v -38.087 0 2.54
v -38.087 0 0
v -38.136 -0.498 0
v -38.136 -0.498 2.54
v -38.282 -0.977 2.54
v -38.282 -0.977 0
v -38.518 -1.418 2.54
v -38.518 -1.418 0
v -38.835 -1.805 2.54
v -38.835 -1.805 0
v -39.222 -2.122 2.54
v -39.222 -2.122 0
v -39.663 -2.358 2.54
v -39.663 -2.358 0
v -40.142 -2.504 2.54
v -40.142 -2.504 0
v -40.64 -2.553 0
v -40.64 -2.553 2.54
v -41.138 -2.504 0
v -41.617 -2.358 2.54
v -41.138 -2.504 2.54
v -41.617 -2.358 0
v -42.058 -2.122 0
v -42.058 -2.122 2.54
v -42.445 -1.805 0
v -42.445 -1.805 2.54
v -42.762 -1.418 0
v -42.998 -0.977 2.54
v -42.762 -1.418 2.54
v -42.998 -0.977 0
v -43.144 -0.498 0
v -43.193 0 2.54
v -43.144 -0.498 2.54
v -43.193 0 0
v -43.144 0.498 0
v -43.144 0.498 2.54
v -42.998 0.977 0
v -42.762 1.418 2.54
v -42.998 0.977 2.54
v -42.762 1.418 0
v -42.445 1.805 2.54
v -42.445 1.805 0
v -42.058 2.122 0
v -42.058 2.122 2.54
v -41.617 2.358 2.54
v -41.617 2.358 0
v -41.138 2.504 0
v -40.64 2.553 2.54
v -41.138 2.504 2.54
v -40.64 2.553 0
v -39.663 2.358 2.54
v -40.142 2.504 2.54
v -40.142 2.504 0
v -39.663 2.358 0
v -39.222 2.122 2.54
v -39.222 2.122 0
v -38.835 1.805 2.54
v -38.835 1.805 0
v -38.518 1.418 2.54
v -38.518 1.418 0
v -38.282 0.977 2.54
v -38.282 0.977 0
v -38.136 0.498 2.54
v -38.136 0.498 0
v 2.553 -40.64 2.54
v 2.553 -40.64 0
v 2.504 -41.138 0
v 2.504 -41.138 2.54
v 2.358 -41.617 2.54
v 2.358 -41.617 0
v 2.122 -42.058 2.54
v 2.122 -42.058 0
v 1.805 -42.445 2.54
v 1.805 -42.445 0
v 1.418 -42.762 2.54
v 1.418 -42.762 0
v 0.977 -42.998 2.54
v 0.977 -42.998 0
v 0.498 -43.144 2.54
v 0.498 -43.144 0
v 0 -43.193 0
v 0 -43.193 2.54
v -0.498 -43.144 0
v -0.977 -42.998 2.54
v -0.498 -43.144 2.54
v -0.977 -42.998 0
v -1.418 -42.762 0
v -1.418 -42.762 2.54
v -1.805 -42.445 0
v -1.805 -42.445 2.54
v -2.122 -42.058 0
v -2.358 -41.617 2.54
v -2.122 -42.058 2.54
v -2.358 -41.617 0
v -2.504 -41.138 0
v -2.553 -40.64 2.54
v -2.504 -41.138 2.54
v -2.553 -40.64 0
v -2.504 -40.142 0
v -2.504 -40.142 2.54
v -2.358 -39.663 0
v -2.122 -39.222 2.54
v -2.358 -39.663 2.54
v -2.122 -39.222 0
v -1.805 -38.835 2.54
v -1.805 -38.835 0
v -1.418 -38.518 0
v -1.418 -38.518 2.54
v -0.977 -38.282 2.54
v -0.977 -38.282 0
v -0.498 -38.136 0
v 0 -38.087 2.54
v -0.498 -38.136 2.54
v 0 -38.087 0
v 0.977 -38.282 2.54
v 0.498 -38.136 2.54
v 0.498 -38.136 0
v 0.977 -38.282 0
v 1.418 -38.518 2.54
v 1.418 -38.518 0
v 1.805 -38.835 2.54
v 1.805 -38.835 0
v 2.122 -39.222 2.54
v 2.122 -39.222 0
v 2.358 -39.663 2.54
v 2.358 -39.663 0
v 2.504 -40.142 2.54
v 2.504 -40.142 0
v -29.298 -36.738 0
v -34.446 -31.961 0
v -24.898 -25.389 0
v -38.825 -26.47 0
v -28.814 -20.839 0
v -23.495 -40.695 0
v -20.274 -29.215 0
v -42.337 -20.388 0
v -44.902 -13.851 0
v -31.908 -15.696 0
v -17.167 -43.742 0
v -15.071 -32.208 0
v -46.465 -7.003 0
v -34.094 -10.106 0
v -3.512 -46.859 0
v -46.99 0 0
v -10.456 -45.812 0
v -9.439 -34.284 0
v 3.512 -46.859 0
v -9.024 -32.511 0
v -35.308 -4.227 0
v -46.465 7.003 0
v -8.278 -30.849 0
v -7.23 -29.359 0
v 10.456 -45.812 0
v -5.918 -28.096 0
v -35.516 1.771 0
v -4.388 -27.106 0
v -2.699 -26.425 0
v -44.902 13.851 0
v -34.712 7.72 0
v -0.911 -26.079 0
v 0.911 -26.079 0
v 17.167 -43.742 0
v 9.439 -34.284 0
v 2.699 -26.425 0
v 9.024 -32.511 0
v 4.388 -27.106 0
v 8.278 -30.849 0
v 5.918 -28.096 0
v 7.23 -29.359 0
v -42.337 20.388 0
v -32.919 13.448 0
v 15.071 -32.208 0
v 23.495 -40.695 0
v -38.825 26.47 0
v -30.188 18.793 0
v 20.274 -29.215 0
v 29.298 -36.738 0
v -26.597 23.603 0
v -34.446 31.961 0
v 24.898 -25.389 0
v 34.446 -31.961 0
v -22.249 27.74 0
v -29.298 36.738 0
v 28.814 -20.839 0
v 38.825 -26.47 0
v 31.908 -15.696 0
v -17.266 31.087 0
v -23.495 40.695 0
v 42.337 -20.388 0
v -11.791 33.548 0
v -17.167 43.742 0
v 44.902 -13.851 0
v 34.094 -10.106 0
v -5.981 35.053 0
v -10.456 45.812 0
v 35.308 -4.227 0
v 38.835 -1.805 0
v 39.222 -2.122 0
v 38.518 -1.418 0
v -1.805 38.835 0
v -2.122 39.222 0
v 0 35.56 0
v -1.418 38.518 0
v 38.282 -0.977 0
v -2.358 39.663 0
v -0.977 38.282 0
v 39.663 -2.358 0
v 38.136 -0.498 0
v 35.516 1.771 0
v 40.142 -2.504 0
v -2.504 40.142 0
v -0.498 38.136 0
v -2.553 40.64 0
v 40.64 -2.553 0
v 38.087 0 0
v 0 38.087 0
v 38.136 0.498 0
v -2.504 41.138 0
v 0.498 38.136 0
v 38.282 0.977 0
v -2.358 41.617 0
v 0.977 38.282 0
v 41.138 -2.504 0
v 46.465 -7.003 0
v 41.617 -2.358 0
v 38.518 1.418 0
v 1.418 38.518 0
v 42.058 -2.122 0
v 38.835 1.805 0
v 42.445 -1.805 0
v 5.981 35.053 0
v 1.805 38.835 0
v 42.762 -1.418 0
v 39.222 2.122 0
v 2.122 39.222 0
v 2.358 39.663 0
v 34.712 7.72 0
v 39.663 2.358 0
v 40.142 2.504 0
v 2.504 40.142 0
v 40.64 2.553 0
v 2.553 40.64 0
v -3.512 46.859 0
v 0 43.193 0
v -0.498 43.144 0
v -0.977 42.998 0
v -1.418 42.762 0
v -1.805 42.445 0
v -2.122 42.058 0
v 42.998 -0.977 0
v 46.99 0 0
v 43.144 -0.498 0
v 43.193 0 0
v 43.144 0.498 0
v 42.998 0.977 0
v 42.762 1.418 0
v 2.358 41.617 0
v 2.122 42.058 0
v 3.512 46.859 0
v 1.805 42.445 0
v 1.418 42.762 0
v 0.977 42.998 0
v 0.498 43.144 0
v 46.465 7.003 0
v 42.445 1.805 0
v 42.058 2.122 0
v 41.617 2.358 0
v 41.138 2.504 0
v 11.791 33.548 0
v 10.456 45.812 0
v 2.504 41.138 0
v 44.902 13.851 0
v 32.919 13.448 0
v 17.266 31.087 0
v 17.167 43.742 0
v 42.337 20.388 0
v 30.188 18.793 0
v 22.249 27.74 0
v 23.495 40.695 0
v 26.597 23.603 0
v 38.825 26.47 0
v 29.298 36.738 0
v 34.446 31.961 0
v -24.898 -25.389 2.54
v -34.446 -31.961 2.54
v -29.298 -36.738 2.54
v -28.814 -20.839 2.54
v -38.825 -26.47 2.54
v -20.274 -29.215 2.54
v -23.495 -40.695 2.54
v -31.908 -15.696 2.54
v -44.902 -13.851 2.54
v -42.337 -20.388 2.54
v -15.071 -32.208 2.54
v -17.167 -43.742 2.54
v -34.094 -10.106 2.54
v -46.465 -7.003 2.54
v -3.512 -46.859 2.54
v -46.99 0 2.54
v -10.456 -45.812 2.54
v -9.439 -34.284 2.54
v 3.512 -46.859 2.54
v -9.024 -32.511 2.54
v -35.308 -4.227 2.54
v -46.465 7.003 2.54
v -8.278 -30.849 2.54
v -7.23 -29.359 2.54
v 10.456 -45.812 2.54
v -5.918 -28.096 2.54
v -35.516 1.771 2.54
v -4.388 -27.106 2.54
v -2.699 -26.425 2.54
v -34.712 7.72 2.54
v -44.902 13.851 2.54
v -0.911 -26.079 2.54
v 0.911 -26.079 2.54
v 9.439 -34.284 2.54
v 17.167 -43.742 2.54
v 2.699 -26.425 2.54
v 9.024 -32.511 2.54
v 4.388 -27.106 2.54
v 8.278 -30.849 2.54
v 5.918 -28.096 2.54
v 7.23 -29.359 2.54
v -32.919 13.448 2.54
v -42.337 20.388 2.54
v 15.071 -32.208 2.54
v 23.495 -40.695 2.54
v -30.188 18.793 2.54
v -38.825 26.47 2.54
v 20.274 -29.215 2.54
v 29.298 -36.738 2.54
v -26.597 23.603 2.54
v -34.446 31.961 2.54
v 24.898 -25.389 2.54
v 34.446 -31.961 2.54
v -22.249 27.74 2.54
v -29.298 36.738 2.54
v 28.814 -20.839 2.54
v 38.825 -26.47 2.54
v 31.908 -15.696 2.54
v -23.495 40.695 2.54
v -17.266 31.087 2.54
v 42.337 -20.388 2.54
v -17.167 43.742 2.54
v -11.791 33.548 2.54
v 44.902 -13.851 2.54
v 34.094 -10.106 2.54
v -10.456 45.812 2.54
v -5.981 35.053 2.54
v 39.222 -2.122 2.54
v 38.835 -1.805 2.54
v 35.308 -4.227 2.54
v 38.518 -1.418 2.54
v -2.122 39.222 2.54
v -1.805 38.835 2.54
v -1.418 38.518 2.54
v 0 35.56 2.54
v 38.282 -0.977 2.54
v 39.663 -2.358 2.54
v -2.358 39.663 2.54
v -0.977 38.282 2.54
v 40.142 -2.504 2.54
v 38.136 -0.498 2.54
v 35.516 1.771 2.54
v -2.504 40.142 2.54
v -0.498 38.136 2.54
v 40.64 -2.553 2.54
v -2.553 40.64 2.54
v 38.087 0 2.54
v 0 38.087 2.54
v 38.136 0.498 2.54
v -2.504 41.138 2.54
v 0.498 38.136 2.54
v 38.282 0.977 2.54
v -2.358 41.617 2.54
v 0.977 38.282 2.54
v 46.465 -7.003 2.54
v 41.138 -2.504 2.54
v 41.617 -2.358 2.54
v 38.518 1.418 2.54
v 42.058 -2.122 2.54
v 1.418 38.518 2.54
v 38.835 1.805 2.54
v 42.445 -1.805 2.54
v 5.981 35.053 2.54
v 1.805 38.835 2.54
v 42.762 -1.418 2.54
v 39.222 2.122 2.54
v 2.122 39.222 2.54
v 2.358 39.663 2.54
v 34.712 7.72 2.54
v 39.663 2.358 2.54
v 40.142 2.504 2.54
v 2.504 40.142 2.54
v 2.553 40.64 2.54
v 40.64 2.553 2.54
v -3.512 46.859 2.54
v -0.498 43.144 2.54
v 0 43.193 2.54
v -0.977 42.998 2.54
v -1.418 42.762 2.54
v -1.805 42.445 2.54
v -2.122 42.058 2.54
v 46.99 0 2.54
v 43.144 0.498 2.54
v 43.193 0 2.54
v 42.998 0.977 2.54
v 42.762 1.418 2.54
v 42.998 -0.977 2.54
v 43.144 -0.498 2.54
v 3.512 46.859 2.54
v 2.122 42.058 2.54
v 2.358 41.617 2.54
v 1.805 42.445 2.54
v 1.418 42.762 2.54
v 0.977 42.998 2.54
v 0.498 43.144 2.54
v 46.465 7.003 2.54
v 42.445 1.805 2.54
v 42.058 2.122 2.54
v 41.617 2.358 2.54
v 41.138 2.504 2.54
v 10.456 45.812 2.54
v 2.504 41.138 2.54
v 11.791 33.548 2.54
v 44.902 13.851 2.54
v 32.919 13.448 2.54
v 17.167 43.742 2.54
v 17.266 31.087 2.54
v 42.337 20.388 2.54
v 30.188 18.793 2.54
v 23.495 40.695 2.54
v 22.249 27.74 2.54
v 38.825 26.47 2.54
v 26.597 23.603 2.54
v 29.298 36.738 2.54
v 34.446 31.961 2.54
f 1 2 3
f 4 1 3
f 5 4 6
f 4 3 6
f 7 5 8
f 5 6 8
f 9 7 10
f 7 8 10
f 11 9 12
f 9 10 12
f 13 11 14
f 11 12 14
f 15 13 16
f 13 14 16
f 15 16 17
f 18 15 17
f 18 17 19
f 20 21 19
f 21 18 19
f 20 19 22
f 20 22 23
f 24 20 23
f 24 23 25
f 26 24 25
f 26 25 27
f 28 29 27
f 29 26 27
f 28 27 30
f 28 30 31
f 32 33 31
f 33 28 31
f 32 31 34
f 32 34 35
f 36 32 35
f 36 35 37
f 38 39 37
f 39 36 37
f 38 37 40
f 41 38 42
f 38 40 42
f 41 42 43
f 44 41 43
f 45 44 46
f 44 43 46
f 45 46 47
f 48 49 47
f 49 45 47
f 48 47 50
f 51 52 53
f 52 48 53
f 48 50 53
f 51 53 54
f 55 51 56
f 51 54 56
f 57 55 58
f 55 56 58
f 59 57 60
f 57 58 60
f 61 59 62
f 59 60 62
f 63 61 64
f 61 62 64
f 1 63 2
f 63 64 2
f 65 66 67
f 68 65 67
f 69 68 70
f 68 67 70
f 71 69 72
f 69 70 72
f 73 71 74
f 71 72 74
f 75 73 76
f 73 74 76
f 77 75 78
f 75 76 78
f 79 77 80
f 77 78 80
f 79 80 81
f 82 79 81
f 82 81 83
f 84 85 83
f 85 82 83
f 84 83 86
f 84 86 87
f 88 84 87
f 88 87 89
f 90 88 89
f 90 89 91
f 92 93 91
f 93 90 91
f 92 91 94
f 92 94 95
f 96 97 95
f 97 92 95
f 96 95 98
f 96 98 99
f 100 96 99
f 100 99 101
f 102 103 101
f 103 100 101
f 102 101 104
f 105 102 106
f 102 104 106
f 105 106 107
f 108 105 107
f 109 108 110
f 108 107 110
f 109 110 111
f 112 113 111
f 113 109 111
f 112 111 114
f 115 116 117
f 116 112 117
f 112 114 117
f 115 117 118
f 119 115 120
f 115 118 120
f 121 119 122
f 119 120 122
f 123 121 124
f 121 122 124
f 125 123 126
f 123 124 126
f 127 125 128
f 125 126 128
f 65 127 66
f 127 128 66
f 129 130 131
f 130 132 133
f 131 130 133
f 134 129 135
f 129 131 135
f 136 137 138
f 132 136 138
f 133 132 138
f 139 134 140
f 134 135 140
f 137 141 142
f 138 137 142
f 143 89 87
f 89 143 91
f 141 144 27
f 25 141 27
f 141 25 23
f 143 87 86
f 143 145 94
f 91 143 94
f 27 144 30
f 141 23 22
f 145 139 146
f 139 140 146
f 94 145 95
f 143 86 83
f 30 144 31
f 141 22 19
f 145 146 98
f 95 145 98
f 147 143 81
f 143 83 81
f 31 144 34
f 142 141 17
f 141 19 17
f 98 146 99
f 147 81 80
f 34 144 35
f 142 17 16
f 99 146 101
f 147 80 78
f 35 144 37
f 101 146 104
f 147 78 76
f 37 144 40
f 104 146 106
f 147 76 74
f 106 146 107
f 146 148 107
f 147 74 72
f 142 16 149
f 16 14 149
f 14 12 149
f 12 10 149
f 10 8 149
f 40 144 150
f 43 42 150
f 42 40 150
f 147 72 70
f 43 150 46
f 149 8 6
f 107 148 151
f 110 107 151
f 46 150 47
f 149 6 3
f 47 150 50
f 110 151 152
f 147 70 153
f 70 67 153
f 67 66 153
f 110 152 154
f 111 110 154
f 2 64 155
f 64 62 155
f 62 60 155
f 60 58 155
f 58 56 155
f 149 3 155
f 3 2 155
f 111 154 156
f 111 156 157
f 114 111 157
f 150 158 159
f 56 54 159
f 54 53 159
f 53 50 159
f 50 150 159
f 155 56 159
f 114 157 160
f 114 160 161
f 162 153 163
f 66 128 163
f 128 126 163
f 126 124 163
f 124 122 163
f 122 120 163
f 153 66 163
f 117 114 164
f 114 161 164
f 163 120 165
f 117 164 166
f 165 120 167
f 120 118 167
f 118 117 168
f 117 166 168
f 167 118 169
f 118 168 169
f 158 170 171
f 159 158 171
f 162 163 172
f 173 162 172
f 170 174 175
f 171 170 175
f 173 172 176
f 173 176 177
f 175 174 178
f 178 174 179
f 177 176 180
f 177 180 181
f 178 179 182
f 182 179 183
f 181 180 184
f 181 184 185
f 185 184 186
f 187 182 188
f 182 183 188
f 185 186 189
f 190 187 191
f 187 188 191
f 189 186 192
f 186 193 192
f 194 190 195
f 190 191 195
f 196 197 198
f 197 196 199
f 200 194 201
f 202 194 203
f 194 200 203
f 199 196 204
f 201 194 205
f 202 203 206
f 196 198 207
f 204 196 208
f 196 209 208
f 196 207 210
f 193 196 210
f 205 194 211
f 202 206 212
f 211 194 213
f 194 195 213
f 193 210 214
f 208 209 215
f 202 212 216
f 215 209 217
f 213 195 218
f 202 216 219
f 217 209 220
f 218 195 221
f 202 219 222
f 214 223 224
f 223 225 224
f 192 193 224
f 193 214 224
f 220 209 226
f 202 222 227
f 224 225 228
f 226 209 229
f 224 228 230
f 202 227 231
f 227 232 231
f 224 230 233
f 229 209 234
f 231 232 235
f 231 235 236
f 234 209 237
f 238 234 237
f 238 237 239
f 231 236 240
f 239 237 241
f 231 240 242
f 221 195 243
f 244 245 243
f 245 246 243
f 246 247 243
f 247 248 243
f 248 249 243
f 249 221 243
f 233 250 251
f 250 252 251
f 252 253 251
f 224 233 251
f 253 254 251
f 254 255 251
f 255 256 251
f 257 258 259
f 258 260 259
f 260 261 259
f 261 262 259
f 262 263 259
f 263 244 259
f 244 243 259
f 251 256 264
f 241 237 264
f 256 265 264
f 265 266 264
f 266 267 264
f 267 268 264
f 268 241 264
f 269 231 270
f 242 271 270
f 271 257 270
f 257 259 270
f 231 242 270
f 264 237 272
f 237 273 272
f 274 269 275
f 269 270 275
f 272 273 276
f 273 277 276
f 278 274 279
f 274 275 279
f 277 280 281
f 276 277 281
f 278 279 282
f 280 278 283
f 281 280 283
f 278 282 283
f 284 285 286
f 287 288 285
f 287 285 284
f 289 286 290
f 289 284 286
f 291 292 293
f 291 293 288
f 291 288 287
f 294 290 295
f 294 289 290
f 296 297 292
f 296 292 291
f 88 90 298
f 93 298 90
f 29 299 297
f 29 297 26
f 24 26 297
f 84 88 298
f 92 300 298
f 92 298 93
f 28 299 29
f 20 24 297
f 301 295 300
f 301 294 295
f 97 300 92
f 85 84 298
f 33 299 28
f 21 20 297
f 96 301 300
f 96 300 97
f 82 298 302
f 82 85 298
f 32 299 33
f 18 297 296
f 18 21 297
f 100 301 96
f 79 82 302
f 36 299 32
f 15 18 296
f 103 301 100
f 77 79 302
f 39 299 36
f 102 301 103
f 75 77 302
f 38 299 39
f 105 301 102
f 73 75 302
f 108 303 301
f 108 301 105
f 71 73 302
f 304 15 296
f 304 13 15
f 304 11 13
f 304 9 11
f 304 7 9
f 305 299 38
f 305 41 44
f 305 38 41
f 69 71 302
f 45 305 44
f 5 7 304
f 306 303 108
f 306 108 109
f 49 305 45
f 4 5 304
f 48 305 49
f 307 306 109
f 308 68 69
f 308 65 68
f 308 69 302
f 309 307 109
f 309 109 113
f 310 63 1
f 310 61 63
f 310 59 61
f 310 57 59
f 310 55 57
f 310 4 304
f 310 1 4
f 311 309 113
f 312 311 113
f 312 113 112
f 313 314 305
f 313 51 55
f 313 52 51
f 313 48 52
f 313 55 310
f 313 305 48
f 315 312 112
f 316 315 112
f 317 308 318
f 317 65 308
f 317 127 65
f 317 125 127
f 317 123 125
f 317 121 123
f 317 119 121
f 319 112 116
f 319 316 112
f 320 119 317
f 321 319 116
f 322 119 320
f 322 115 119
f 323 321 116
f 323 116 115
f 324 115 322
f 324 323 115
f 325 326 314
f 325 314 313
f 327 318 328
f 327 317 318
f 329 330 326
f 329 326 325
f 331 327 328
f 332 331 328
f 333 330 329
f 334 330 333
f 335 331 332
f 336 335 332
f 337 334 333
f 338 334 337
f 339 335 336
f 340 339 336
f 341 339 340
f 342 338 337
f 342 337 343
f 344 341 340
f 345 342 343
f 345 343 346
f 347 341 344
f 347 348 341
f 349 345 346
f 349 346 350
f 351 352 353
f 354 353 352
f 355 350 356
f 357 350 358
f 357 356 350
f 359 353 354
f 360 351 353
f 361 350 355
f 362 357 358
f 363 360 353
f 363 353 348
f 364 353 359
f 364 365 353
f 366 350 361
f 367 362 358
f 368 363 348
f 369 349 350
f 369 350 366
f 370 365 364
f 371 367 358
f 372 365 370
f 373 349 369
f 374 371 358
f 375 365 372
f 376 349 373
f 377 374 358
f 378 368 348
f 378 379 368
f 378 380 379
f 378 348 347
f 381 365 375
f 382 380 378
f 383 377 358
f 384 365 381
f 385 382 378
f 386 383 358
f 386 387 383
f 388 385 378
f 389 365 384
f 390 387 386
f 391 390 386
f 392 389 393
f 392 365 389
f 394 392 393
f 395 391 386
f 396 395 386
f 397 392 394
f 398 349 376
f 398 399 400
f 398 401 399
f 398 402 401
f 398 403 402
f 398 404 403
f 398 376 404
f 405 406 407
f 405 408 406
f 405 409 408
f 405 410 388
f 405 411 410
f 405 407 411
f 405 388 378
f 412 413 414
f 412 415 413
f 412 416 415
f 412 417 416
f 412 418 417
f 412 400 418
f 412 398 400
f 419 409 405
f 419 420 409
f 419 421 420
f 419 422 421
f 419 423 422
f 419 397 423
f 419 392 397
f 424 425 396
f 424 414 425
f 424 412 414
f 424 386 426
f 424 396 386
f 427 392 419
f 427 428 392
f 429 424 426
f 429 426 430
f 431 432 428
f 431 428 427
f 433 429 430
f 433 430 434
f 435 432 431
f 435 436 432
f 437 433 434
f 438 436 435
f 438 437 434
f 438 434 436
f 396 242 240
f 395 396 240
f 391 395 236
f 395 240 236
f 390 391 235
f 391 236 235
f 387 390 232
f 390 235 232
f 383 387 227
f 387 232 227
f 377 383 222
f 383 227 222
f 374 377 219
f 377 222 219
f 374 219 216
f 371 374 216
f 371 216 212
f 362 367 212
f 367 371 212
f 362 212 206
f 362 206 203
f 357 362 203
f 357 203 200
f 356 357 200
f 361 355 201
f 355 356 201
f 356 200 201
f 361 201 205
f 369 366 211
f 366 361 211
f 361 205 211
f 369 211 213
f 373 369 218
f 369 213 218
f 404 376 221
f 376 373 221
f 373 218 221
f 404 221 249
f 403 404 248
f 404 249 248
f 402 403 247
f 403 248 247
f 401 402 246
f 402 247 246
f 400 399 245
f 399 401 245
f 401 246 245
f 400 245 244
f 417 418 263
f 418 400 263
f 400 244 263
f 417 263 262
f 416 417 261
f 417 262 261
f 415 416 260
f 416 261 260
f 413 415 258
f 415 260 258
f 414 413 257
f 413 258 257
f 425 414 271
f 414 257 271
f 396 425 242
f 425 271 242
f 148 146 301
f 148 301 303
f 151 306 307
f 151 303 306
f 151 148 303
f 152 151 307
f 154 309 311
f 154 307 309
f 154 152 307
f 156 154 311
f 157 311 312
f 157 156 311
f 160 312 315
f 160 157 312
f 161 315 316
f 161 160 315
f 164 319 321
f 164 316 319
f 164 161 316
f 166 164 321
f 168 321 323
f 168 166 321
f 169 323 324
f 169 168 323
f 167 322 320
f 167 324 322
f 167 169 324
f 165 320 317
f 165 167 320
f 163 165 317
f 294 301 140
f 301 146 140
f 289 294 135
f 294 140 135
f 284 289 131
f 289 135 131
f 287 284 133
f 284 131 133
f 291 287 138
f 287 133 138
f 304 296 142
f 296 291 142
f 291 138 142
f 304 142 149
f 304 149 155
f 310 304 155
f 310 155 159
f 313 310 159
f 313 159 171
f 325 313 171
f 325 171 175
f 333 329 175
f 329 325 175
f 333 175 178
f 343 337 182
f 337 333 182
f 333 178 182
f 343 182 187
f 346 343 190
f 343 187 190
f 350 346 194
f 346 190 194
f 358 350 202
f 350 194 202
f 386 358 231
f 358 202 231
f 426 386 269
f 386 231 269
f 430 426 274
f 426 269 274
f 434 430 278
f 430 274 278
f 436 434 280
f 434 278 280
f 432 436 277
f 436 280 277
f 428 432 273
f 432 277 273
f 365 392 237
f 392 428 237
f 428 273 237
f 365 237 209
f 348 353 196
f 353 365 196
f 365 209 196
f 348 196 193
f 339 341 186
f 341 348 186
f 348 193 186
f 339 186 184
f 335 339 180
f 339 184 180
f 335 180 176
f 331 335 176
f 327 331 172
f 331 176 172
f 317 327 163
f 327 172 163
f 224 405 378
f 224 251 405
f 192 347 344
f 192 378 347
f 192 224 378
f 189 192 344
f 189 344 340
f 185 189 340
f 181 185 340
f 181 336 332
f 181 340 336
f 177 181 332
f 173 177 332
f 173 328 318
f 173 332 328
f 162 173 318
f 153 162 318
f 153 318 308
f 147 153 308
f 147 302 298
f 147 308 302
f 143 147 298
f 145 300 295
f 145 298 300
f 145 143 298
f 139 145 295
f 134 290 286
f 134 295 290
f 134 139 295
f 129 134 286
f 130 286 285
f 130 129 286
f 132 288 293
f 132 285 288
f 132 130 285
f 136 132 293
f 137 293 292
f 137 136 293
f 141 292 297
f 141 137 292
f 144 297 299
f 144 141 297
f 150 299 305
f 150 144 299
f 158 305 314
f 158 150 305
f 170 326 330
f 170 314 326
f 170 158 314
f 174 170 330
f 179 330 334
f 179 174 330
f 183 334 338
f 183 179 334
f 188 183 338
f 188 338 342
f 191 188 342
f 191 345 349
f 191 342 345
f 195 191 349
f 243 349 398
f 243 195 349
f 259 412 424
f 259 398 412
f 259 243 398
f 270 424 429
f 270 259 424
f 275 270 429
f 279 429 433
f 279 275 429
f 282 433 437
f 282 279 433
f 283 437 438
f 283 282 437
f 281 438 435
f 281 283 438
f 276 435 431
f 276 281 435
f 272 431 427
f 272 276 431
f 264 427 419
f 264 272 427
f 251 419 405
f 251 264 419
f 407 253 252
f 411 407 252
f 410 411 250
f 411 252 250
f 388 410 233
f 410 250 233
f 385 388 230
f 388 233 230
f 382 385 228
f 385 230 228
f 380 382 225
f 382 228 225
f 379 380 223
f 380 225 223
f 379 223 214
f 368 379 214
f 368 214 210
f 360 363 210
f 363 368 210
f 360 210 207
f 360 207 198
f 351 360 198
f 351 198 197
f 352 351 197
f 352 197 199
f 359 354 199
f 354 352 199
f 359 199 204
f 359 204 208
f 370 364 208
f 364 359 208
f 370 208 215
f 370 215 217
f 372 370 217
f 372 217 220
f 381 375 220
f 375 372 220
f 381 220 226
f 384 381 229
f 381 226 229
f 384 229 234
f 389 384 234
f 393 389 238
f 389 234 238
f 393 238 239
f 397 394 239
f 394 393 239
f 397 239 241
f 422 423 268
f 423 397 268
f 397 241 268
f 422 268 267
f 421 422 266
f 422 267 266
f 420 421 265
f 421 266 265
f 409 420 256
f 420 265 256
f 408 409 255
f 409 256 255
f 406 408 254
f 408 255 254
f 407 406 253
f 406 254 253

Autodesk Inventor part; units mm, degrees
ref_plane "YZ Plane" through (0, 0, 0) normal (1, 0, 0) x (0, 1, 0)
ref_plane "XZ Plane" through (0, 0, 0) normal (0, 1, 0) x (-1, 0, 0)
ref_plane "XY Plane" through (0, 0, 0) normal (0, 0, 1) x (1, 0, 0)
sketch "Sketch1" plane through (0, 0, 0) normal (0, 0, 1) x (1, 0, 0)
  arc A0 (9.4392, -34.2843) -> (-9.4392, -34.2843) centre (0, 0) ccw
  circle A1 centre (0, 0) radius 46.99
  arc A2 (9.4392, -34.2843) -> (-9.4392, -34.2843) centre (0, -35.56) ccw
  circle A3 centre (0, 40.64) radius 2.5527
  circle A4 centre (-40.64, 0) radius 2.5527
  circle A5 centre (0, -40.64) radius 2.5527
  circle A6 centre (40.64, 0) radius 2.5527
  point P0 (0, 46.99)
  dimension "d1" = 93.98
  dimension "d0" = 71.12
  dimension "d2" = 19.05
  dimension "d8" = 360
  dimension "d12" = 5.1054
  dimension "d13" = 6.35
extrude "Extrusion1" add sketch "Sketch1" along normal blind 2.54
properties part number "Gasket" material "Aluminum 6061"
